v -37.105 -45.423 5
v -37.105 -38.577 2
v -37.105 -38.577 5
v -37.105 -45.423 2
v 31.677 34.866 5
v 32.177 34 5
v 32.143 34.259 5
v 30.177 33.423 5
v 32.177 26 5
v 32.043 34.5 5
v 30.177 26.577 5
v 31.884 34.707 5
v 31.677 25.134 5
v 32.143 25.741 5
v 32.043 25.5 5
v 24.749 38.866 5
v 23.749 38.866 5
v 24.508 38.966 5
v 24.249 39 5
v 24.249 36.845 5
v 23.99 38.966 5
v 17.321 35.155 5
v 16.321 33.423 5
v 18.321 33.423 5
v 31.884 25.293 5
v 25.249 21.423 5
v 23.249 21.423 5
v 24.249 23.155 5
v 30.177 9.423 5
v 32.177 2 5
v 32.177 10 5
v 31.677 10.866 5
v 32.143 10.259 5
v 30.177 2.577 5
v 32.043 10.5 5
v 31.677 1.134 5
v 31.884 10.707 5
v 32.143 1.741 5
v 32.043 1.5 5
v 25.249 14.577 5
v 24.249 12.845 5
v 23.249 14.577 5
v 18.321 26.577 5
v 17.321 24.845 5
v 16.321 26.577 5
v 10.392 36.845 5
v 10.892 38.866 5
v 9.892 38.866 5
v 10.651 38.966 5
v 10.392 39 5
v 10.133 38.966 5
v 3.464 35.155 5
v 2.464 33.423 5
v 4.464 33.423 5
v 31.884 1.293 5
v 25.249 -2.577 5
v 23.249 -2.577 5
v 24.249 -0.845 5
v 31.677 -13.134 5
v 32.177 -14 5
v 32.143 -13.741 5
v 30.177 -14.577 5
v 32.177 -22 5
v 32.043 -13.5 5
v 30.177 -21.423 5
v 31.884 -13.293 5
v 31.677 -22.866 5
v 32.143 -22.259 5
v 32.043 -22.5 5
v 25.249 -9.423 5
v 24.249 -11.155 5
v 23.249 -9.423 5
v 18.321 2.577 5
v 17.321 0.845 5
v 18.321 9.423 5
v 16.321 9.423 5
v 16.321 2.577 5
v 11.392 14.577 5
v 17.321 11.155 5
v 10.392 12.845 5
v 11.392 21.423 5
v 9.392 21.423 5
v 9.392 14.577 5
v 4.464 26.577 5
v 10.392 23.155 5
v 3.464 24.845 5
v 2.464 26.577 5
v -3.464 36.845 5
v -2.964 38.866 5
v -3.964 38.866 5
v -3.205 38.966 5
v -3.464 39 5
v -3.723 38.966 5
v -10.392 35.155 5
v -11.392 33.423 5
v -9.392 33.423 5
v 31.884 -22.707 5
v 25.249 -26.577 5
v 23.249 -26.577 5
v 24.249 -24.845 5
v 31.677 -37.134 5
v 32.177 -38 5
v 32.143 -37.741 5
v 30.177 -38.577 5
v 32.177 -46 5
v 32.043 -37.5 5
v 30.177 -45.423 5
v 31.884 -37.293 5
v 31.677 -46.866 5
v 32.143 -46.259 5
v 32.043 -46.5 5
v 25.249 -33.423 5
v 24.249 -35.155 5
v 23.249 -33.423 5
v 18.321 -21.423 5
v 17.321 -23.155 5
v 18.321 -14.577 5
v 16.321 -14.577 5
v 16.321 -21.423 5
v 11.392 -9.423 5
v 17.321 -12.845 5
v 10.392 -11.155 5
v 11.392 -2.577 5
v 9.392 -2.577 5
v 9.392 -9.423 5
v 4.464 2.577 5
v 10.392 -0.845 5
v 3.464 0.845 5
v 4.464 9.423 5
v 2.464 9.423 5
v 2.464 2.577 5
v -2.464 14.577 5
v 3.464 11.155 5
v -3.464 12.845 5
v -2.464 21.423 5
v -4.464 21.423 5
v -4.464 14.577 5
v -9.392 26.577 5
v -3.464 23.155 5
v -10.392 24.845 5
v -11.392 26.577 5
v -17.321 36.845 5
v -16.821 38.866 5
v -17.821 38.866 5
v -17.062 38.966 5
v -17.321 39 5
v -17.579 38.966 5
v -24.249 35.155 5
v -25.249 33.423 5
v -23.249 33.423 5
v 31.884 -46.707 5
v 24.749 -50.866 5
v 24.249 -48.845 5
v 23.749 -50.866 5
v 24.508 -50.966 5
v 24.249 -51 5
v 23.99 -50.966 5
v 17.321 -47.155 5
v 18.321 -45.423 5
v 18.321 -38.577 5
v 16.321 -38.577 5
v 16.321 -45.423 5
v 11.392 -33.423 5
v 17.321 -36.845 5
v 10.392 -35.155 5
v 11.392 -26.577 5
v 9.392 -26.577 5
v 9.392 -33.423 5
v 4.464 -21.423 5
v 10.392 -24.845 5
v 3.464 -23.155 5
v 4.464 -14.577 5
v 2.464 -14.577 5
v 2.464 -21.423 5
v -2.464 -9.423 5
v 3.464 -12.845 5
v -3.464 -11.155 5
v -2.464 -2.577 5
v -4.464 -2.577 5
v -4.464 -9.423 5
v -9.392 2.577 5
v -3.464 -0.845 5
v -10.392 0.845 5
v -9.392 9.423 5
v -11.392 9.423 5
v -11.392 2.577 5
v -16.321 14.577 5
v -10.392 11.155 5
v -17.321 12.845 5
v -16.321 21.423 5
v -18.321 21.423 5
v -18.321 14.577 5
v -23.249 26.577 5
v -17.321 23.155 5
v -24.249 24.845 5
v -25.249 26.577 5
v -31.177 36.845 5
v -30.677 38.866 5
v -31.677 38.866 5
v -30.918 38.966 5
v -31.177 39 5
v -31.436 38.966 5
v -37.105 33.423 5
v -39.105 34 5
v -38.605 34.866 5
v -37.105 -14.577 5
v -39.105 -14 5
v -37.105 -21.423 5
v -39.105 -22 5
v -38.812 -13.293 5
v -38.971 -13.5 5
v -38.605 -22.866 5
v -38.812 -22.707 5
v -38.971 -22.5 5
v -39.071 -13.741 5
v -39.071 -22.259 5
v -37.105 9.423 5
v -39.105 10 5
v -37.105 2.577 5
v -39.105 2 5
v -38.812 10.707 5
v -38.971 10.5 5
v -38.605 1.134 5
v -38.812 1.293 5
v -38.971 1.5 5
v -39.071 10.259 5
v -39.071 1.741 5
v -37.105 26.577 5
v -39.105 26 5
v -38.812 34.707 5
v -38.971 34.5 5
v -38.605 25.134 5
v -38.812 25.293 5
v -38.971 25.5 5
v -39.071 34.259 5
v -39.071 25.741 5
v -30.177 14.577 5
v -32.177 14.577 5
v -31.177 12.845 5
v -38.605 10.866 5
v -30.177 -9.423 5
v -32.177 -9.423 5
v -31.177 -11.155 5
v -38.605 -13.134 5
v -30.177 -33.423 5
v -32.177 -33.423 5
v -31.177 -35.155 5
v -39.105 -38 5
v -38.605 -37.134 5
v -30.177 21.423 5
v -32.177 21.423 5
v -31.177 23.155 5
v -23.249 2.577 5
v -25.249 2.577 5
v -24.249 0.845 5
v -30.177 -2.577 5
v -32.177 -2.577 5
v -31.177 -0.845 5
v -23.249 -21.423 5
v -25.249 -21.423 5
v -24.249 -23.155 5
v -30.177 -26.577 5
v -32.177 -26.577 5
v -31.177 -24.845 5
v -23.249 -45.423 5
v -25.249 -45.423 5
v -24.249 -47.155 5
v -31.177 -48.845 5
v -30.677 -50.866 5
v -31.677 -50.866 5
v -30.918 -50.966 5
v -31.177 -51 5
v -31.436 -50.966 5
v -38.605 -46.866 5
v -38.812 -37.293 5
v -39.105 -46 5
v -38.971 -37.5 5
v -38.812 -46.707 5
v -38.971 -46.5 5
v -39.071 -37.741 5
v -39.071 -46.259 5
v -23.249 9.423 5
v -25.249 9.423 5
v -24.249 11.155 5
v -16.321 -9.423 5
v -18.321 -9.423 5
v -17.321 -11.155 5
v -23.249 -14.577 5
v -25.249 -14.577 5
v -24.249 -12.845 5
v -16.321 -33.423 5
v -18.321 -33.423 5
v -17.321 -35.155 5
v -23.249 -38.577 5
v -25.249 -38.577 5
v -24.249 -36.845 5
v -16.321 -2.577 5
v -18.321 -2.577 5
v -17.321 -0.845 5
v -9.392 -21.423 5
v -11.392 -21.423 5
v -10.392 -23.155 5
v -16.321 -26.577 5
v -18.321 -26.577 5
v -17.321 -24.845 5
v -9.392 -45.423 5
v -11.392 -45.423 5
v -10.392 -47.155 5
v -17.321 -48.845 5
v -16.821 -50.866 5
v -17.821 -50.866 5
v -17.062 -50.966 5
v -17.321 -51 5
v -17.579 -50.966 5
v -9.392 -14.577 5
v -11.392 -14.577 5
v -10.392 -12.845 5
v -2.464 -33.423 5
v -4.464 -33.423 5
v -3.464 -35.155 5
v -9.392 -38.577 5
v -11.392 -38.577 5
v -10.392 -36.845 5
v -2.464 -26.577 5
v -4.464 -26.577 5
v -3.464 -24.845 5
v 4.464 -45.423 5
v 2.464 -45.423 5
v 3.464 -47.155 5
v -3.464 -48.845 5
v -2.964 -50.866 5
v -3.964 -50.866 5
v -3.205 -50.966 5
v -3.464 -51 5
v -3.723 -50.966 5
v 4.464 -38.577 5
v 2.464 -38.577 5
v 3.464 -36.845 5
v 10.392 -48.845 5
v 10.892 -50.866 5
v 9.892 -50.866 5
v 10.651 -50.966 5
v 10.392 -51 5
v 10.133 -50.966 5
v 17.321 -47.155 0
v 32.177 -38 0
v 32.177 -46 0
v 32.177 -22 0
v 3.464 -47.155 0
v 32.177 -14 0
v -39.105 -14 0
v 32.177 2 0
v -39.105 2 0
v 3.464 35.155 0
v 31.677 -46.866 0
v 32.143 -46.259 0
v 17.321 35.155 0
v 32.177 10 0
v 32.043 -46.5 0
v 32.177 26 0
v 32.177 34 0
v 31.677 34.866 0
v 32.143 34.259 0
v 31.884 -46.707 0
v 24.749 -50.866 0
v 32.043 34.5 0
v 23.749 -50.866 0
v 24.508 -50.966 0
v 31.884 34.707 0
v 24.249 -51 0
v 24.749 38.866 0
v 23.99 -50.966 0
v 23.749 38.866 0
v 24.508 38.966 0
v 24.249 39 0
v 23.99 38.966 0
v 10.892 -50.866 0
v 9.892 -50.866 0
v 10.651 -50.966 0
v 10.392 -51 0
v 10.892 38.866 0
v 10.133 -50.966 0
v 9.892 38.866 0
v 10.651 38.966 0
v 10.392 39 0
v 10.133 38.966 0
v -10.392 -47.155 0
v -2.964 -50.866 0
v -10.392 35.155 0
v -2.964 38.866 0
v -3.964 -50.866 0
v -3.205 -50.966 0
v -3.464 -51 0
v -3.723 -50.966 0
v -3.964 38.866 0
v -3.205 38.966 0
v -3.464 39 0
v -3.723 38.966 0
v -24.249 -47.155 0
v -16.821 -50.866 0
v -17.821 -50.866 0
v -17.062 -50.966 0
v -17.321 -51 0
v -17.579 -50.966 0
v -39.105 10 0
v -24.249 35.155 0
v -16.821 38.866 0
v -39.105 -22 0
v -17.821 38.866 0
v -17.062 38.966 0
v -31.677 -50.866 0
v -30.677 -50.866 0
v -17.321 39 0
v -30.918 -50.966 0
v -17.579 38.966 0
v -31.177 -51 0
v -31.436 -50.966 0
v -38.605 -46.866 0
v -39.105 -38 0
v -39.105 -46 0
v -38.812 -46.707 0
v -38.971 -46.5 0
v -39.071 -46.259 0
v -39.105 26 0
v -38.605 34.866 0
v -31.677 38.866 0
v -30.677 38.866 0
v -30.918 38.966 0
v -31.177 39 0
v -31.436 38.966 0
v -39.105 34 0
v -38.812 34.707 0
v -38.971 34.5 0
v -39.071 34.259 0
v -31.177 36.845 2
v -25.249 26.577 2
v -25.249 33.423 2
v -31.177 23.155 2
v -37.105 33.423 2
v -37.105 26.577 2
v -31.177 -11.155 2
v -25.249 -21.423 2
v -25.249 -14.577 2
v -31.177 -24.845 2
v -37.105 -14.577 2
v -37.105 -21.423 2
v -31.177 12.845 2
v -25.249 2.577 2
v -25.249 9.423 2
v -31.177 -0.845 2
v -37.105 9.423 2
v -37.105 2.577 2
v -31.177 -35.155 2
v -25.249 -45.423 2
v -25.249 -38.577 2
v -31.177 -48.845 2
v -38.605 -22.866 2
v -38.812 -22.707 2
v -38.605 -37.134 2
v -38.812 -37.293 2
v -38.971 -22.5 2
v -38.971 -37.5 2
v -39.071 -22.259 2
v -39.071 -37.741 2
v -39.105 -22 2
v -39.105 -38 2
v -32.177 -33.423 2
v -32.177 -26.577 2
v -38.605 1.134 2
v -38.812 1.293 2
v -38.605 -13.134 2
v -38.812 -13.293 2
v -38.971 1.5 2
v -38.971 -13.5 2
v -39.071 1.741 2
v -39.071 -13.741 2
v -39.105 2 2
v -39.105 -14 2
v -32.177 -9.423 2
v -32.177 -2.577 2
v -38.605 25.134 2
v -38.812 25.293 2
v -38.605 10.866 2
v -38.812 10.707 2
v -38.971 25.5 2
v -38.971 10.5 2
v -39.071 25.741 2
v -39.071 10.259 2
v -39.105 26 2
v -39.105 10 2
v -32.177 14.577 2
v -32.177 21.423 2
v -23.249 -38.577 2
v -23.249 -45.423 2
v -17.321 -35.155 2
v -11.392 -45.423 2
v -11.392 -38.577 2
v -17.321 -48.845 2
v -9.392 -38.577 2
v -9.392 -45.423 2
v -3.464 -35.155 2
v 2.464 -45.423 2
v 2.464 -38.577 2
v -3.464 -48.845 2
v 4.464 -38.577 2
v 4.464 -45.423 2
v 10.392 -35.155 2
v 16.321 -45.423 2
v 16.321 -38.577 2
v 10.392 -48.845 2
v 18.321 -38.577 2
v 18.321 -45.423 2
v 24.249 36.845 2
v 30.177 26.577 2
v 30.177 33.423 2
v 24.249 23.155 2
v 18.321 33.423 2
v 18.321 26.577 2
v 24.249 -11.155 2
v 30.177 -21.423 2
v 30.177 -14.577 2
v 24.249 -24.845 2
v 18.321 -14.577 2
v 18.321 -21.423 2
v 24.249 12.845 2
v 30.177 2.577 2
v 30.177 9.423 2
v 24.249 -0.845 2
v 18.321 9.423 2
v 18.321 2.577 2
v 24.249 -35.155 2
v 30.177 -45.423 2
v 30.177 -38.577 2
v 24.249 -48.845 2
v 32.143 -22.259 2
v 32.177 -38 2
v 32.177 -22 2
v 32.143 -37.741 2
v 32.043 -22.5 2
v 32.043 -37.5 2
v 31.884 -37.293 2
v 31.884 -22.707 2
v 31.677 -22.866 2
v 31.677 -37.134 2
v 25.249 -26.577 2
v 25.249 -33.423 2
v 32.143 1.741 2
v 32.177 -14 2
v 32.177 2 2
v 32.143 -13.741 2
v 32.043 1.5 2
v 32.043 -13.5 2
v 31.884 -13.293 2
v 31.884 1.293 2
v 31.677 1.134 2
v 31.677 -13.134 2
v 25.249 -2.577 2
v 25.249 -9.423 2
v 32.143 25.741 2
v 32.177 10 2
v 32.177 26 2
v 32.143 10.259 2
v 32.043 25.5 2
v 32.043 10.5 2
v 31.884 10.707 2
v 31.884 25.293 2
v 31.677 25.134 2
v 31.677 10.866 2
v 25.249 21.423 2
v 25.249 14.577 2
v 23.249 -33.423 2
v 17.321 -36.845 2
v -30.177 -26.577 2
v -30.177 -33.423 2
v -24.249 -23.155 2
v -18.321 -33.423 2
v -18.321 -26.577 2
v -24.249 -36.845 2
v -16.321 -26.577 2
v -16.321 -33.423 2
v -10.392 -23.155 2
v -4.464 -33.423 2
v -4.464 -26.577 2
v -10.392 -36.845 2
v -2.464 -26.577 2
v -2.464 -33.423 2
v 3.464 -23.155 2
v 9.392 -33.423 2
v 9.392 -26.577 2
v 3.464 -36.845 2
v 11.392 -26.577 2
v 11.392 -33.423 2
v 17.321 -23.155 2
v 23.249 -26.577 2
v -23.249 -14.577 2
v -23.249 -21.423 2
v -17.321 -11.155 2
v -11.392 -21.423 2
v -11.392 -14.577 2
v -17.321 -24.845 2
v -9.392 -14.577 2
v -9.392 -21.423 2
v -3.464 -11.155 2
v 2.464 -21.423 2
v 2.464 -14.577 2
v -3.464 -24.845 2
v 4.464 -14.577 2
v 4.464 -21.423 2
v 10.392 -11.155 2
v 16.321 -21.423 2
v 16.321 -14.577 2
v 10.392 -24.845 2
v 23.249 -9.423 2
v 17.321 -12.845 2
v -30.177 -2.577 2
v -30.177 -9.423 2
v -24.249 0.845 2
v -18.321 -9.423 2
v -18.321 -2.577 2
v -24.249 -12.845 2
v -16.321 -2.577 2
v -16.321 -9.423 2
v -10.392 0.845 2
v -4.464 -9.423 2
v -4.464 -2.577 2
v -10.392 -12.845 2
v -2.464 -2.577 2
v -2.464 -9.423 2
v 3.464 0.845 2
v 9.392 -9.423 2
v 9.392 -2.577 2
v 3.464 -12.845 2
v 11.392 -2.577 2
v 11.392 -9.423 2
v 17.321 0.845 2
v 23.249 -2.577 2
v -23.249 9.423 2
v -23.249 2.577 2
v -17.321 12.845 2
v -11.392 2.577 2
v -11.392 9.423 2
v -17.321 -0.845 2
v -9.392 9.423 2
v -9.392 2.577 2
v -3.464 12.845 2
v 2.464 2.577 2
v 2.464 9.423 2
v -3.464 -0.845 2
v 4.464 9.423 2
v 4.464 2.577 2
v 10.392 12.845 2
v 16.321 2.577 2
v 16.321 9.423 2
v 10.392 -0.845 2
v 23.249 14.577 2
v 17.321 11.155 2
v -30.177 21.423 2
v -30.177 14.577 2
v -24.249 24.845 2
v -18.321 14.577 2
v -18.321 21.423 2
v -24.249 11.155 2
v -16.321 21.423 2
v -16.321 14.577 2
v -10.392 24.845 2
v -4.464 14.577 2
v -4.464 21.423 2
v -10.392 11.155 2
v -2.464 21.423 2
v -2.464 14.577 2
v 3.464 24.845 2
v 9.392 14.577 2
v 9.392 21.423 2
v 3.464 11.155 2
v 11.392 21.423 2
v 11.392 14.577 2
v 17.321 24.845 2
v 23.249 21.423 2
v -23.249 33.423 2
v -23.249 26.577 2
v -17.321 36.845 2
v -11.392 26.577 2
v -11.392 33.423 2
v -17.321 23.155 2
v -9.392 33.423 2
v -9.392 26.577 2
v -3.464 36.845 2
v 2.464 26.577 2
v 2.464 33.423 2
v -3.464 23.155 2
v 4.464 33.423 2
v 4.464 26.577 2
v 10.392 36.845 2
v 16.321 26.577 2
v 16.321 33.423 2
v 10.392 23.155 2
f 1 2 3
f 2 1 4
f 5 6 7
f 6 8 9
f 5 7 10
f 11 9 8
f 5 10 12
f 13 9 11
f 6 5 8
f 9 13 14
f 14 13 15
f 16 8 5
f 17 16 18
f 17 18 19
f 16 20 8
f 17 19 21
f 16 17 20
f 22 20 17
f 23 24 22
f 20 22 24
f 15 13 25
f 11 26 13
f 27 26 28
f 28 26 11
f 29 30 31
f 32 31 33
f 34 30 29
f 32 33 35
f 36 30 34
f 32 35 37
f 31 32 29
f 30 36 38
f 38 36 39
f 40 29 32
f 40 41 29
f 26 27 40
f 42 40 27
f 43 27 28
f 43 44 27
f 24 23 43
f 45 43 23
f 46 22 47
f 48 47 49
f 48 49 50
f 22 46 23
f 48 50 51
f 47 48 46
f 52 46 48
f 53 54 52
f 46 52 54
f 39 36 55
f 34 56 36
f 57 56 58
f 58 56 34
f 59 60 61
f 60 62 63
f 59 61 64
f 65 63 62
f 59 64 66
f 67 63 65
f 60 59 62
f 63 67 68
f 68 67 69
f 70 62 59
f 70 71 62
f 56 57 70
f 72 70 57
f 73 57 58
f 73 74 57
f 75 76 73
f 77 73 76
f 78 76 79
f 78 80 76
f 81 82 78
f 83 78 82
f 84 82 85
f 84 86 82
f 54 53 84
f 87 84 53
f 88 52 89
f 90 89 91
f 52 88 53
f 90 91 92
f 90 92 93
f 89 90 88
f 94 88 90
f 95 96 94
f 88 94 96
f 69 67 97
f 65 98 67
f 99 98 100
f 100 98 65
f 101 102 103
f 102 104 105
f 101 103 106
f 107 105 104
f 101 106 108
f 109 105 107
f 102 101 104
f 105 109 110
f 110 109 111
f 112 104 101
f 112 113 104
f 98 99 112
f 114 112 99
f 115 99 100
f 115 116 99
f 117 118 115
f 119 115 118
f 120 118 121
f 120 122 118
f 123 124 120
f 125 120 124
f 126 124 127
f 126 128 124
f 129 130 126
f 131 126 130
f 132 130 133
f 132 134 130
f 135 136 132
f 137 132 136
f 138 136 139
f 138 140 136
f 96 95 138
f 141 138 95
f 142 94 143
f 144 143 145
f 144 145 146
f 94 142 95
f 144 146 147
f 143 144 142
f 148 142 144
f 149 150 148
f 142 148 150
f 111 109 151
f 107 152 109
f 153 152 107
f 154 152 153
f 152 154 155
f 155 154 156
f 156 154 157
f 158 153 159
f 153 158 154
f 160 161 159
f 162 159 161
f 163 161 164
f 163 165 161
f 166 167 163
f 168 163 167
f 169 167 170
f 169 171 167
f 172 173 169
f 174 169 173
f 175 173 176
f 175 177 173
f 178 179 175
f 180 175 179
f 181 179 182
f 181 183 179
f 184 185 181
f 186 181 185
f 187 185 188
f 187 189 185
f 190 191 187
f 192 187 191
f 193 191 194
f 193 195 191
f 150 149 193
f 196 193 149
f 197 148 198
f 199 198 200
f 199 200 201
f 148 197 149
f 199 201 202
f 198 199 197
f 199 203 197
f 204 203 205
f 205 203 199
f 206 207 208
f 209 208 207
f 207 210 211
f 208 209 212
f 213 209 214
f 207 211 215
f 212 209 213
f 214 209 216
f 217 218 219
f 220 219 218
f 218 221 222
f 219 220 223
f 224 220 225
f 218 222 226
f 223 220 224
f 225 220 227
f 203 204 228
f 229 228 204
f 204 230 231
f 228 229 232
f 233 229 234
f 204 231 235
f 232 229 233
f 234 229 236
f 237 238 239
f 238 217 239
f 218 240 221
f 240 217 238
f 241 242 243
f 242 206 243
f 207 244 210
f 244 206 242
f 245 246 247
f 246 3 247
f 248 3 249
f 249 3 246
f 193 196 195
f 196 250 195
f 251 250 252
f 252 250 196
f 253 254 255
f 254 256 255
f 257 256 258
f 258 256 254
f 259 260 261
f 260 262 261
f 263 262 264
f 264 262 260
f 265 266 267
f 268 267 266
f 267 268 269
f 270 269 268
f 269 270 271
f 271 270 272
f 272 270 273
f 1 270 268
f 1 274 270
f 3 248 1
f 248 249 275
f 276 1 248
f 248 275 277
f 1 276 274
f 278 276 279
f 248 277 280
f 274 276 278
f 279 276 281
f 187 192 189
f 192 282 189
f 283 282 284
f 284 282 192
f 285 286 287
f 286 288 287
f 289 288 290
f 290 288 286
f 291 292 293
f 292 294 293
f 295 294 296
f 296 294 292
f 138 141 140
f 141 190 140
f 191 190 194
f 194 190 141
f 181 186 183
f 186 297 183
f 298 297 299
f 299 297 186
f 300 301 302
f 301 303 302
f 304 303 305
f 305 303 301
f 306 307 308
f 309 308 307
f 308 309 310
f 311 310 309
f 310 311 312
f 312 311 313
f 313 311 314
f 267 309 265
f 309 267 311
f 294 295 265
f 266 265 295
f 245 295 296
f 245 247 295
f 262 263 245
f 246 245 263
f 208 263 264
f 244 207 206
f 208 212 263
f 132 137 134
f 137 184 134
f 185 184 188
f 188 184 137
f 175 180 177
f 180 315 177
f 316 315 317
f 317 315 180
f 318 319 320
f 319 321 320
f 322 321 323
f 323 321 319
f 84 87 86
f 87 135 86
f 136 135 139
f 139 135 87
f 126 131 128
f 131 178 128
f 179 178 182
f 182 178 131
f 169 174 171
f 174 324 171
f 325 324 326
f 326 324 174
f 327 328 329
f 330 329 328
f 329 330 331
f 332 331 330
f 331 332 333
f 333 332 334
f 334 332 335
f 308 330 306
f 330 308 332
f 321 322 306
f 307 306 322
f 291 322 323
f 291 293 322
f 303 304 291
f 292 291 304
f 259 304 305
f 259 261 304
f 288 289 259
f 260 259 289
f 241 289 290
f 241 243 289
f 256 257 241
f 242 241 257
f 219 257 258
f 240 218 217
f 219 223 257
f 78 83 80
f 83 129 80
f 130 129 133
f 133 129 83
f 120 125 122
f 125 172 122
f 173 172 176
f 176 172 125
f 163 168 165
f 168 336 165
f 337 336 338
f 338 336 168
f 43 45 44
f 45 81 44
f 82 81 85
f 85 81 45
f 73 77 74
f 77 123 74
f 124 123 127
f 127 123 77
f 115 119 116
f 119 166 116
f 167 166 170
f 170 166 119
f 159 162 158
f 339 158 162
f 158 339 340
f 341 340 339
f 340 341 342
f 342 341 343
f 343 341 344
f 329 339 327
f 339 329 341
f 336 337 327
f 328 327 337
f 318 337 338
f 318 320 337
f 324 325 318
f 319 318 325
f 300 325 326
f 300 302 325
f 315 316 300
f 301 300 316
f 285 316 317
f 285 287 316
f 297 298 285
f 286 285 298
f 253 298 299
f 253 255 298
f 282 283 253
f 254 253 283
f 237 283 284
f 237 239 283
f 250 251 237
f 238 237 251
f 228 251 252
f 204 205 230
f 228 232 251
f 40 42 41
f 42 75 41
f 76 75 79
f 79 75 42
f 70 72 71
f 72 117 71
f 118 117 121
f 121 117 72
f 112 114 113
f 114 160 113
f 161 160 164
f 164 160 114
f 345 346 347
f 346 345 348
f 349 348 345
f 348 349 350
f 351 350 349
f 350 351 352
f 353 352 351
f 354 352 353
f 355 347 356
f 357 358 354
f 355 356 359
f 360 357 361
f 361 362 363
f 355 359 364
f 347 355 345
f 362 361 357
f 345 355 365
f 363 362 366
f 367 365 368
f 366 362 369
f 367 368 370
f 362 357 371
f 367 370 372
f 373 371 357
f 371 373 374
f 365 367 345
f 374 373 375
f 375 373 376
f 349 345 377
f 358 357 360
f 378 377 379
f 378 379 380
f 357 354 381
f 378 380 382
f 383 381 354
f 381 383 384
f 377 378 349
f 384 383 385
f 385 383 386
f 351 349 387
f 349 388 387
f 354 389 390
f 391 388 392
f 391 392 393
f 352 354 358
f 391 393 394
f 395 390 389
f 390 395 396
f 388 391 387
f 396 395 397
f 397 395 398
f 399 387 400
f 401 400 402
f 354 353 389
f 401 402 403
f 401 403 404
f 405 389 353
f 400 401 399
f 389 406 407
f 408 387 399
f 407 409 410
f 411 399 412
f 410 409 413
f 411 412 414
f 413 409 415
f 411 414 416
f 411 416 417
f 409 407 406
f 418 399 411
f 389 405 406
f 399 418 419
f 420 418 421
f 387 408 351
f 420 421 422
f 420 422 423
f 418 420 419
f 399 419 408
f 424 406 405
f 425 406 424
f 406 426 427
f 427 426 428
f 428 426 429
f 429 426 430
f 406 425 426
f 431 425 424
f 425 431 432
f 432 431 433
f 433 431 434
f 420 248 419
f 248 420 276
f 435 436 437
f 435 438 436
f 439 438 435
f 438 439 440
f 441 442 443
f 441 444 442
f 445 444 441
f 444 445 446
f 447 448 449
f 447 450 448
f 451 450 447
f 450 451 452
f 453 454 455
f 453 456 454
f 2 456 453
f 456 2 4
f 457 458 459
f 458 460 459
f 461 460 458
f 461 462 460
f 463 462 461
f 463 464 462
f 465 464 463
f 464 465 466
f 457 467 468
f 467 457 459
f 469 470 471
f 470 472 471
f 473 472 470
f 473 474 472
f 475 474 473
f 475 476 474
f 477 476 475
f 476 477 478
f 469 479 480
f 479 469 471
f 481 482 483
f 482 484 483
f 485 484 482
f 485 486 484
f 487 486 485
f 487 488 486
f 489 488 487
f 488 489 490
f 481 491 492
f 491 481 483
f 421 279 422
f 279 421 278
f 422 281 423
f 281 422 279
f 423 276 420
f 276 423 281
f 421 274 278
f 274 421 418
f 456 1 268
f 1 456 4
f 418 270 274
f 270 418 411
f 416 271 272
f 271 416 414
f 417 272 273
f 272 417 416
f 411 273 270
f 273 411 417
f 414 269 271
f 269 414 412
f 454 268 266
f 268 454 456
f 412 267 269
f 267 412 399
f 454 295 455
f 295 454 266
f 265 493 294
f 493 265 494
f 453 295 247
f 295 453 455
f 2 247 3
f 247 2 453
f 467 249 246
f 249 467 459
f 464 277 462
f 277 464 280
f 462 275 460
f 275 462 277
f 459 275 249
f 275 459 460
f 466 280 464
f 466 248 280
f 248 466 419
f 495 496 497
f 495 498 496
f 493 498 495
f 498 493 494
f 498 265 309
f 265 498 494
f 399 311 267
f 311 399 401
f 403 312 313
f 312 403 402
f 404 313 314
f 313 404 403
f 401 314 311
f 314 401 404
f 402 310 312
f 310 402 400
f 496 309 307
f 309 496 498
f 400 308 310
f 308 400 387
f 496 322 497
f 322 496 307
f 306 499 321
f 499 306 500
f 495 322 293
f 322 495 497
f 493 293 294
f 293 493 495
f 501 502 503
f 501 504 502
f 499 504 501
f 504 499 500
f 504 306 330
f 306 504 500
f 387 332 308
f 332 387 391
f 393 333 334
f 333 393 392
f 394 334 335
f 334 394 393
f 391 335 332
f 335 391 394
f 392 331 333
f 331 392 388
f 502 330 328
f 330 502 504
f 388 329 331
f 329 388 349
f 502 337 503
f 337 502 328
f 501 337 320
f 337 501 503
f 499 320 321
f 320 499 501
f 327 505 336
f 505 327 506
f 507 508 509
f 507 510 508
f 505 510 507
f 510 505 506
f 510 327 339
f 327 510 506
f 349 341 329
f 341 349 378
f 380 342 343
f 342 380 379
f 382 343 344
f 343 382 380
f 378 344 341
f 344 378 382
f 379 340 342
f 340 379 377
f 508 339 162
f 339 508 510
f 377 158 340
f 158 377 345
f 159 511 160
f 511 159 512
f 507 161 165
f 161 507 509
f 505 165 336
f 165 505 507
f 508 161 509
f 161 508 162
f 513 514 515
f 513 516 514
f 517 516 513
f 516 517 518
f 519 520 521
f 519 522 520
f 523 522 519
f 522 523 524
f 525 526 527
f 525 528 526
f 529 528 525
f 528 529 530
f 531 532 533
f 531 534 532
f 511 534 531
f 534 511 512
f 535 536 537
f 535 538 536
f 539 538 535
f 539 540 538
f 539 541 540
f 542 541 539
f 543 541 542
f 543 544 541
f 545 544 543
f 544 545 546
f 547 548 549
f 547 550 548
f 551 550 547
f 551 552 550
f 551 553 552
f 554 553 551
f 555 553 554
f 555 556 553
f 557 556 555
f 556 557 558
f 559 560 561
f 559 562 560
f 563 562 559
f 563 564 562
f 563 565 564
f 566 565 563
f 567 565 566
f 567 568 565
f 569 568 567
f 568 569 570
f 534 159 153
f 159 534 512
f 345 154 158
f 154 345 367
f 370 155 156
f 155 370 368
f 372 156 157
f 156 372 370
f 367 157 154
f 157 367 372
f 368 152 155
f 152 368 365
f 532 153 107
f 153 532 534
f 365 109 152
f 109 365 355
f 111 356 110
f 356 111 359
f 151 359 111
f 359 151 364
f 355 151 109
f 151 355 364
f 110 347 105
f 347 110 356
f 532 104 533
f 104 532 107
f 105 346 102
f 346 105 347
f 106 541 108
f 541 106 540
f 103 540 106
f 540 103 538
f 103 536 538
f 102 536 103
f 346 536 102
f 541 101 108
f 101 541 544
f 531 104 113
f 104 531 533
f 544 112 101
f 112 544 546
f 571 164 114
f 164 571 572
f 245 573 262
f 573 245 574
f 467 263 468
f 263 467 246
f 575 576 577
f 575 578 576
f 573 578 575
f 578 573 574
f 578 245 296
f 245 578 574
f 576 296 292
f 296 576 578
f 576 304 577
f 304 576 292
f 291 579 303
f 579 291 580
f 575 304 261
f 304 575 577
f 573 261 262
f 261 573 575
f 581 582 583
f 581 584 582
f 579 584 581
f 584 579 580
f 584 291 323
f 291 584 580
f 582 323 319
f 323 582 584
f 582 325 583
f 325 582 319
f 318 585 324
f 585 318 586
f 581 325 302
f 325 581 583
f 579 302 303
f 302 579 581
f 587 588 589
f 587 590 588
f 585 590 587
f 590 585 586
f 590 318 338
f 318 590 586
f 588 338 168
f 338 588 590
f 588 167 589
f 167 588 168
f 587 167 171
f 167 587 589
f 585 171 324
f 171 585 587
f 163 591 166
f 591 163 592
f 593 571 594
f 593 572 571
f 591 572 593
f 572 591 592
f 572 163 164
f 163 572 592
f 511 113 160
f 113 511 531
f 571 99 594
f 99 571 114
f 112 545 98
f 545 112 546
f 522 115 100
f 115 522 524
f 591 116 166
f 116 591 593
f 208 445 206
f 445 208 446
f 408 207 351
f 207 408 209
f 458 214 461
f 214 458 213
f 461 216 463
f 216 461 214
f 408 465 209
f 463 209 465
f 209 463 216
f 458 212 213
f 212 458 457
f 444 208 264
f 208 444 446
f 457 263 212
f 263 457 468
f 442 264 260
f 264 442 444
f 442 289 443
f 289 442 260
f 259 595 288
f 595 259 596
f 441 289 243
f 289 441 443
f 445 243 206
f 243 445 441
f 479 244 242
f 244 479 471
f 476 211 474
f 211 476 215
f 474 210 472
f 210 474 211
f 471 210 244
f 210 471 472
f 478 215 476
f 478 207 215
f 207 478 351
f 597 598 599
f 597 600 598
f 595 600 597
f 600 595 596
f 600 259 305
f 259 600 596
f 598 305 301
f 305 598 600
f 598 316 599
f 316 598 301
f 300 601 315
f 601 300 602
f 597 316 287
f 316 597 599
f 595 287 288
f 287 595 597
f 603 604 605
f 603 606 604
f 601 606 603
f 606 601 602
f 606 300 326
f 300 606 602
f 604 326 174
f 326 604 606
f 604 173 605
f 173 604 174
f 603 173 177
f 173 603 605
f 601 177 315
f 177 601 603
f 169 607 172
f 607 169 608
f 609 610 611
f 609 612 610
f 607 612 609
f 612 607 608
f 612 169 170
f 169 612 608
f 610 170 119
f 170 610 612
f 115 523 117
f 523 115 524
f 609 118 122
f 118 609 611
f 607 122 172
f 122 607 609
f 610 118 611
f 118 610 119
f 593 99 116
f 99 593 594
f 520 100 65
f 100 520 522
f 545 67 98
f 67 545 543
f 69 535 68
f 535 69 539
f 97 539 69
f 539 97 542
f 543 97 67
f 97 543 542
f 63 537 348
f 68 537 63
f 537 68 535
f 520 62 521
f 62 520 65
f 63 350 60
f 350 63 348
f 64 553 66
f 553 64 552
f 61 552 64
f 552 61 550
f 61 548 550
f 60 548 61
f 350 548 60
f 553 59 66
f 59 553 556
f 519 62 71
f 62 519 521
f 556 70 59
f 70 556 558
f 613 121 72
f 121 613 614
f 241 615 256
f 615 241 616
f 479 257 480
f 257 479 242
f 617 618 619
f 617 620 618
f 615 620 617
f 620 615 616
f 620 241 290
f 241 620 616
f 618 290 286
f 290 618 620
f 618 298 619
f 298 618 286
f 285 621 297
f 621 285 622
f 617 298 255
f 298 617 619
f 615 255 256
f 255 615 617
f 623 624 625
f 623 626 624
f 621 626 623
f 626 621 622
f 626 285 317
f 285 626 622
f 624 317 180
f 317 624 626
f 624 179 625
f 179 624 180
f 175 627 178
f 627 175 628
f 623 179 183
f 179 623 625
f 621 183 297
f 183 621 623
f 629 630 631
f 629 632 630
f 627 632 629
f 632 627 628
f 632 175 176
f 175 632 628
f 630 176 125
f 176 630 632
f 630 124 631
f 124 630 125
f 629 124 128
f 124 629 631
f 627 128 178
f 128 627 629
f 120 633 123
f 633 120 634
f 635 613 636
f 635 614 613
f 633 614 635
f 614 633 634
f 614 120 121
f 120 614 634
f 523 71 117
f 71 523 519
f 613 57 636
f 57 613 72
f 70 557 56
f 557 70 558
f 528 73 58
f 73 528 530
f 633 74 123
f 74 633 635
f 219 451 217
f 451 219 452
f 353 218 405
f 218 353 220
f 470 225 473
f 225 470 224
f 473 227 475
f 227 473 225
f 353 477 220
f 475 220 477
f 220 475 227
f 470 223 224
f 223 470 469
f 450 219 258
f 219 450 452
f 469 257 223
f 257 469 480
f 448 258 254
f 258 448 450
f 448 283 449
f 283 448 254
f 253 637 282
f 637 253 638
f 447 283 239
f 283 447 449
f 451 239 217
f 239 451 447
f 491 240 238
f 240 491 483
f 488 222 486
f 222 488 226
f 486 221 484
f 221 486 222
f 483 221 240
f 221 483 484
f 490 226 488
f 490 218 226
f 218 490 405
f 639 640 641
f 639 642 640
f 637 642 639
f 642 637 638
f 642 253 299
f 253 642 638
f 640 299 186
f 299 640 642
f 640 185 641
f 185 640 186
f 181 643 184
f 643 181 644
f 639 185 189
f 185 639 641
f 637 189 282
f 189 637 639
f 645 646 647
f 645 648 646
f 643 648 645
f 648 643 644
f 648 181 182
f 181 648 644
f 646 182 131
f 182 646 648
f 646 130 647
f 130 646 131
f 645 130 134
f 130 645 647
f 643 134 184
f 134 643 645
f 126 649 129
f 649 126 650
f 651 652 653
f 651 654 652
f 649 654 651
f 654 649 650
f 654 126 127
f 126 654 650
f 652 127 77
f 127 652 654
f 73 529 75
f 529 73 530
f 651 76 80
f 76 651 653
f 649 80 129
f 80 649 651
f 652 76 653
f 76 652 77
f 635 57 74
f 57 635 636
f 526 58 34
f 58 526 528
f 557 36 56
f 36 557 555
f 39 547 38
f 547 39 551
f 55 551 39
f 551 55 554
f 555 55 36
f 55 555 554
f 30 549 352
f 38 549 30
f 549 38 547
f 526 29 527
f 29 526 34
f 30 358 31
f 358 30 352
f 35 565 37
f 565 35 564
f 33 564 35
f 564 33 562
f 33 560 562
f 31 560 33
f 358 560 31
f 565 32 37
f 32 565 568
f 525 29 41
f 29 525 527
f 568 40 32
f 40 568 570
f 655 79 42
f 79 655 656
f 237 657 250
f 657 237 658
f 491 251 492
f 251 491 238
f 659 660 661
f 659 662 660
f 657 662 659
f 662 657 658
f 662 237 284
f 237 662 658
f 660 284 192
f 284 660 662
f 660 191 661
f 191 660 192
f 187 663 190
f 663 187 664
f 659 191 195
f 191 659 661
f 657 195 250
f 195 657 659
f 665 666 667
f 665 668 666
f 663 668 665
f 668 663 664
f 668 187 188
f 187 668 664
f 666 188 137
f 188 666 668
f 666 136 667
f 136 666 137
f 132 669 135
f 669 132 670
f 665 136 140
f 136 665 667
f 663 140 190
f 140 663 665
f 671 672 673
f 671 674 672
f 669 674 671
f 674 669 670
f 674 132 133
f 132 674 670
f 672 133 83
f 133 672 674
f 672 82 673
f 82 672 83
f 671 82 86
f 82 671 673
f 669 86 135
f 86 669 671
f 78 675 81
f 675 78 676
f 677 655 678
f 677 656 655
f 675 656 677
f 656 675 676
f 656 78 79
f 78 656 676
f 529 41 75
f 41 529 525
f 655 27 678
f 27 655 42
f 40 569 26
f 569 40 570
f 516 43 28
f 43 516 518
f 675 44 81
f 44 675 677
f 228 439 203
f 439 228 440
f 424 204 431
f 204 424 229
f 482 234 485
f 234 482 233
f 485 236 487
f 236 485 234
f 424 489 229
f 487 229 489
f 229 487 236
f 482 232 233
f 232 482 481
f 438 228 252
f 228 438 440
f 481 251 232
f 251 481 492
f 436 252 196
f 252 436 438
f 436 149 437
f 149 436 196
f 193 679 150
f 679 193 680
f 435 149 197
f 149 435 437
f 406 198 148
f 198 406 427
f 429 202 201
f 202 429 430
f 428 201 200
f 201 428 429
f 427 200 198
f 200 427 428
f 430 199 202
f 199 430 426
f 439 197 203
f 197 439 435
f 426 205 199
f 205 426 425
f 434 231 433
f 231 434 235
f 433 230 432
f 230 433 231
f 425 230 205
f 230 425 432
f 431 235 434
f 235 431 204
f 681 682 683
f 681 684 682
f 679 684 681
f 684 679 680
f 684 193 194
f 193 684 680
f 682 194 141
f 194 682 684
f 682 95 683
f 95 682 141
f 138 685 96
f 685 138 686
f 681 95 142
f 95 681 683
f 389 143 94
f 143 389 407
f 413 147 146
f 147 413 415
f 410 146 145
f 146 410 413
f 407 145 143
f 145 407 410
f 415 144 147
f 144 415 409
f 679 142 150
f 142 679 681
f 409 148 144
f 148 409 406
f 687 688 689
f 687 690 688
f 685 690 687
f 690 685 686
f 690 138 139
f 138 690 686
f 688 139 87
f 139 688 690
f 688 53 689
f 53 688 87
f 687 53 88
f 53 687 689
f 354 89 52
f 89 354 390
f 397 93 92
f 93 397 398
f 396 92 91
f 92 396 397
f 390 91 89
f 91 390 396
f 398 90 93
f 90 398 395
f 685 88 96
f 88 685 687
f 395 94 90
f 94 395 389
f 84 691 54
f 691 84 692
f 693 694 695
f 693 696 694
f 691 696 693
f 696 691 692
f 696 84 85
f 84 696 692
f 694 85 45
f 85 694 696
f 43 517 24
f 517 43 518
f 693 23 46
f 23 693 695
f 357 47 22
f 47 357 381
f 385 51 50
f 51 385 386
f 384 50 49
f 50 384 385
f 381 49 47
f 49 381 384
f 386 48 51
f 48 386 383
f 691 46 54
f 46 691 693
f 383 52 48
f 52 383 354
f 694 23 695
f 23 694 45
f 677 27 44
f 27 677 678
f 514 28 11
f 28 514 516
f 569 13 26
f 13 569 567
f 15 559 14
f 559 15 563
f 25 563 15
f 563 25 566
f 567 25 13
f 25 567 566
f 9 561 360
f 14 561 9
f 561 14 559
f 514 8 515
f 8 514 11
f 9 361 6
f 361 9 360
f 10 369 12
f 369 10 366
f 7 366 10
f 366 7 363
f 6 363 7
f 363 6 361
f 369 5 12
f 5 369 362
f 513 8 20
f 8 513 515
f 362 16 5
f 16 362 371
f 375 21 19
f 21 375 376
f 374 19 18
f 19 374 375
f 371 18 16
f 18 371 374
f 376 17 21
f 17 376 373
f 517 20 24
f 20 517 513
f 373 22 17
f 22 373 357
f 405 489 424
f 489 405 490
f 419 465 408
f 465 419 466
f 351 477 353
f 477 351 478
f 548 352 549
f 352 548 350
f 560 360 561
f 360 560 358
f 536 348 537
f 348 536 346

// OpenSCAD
// Measured vertex to vertex
slot_radius =  8;
slot_depth  =  3;
number_of_columns  =  4.5;
number_of_rows =  7;
wall_thickness =  2;
bottom_thickness =  2;
first_line_type = 0; // [1:Short, 0:Long]
use_tabs = 1; // [0:No, 1:Yes]

S30 = sin(30);
C30 = cos(30);

nNumShort = floor(number_of_columns);
nNumLong  = ceil(number_of_columns);
nNumOdd   = first_line_type ? nNumLong : nNumShort;
nNumEven  = first_line_type ? nNumShort : nNumLong;

vFullWidth = (nNumShort==nNumLong ? nNumLong+0.5 : nNumLong)*2*slot_radius*C30+wall_thickness;

iFirstLong = first_line_type ? 1 : 0;
iLastLong  = (number_of_rows+first_line_type)%2 ? number_of_rows-1 : number_of_rows-2;

iFirstLongEnd = nNumOdd == nNumEven ? 1-first_line_type : iFirstLong;
iLastLongEnd  = nNumOdd == nNumEven ? number_of_rows-2+first_line_type : iLastLong;

echo("iFirstLongEnd", iFirstLongEnd);
echo("iLastLongEnd", iLastLongEnd);
module holder(r, h) {
	for (i=[0:5]) rotate(a = [0,0,60*i]) translate([-slot_radius*C30,-slot_radius/2,0]) {
		cylinder(r = wall_thickness/2, h=bottom_thickness + slot_depth, $fa=15, $fs = 0.1);
		translate([-wall_thickness/2,0,0]) {
			cube(size = [wall_thickness, slot_radius, bottom_thickness + slot_depth], center = false);
			cube(size = [slot_radius, slot_radius, bottom_thickness], center = false);
		}
	}
}

//rotate([0,0,$t*360]) 
translate([-number_of_columns*slot_radius*C30,-number_of_rows*slot_radius*(1+S30)/2,0])
union() {
	for (iH = [0:number_of_rows-1]) {
		translate([slot_radius*C30*((iH+first_line_type)%2),iH*slot_radius*(1+S30),0])
			for (iW = [0:(iH%2 ? nNumOdd : nNumEven)-1]) {
				translate([iW*slot_radius*2*C30,0,0])
					holder(slot_radius, slot_depth);
			}
	}
	if (use_tabs) {
		translate([-slot_radius*C30-wall_thickness/2,iFirstLong*2*slot_radius*C30*C30,0]) {
				cube(size=[
					slot_radius*C30+wall_thickness/2,
					(iLastLong-iFirstLong)*2*slot_radius*C30*C30,
					bottom_thickness], center=false);
		}
		translate([vFullWidth - 2*slot_radius*C30-2*wall_thickness/2,iFirstLongEnd*2*slot_radius*C30*C30,0]) {
				cube(size=[
					slot_radius*C30+wall_thickness/2,
					(iLastLongEnd-iFirstLongEnd)*2*slot_radius*C30*C30,
					bottom_thickness], center=false);
		}
	}
}
